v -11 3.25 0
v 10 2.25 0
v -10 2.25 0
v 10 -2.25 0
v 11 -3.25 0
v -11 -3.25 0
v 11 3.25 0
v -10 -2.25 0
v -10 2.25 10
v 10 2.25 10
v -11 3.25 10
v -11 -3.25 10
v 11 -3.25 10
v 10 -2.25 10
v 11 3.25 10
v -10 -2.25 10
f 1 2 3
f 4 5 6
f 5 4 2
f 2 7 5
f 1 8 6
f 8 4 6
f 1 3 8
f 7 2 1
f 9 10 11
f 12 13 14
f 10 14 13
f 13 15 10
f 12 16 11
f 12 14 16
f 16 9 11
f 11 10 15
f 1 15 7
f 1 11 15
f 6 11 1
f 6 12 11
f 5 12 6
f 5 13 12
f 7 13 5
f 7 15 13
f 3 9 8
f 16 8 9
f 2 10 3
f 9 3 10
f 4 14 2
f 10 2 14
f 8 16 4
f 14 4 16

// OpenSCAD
// Dimension in the direction across the strap in mm. Should be slightly larger (say 1mm) longer than the strap width
inner_width = 20; // [8:0.5:30]

// Dimension in the direction of the strap thinkness in mm. Should be about twice the strap thickness to allow the excess strap to tuck in.
inner_height = 4.5; // [1:0.5:10]

// Dimension in the direction along the strap in mm.
depth = 10; // [1:0.5:25]

// Thickness of the keeper in mm.
thickness = 1; //[0.5:0.1:5]

// Squared or rounded edges?
edge_type = "square"; // [square, rounded]

module rectangular_section(w, h, t) {
    difference() {
        square([w + t*2, h + t*2], center = true);
        square([w, h], center = true);
    }
}

module rounded_profile(w, h) {
    union() {
        square([w - h, h], center = true);
        translate([-(w/2 - h/2), 0, 0]) {
            circle(d=h, $fn=100);
        }
        translate([w/2 - h/2, 0, 0]) {
            circle(d=h, $fn=100);
        }
    }
}

module rounded_section(w, h, t) {
    difference() {
        rounded_profile(w + t*2, h + t*2);
        rounded_profile(w, h);
    }
}

module section(w, h, t) {
    if (edge_type == "square") {
        rectangular_section(w, h, t);
    } else {
        rounded_section(w, h, t);
    }
}

linear_extrude(height = depth) {
    section(inner_width, inner_height, thickness);
}
